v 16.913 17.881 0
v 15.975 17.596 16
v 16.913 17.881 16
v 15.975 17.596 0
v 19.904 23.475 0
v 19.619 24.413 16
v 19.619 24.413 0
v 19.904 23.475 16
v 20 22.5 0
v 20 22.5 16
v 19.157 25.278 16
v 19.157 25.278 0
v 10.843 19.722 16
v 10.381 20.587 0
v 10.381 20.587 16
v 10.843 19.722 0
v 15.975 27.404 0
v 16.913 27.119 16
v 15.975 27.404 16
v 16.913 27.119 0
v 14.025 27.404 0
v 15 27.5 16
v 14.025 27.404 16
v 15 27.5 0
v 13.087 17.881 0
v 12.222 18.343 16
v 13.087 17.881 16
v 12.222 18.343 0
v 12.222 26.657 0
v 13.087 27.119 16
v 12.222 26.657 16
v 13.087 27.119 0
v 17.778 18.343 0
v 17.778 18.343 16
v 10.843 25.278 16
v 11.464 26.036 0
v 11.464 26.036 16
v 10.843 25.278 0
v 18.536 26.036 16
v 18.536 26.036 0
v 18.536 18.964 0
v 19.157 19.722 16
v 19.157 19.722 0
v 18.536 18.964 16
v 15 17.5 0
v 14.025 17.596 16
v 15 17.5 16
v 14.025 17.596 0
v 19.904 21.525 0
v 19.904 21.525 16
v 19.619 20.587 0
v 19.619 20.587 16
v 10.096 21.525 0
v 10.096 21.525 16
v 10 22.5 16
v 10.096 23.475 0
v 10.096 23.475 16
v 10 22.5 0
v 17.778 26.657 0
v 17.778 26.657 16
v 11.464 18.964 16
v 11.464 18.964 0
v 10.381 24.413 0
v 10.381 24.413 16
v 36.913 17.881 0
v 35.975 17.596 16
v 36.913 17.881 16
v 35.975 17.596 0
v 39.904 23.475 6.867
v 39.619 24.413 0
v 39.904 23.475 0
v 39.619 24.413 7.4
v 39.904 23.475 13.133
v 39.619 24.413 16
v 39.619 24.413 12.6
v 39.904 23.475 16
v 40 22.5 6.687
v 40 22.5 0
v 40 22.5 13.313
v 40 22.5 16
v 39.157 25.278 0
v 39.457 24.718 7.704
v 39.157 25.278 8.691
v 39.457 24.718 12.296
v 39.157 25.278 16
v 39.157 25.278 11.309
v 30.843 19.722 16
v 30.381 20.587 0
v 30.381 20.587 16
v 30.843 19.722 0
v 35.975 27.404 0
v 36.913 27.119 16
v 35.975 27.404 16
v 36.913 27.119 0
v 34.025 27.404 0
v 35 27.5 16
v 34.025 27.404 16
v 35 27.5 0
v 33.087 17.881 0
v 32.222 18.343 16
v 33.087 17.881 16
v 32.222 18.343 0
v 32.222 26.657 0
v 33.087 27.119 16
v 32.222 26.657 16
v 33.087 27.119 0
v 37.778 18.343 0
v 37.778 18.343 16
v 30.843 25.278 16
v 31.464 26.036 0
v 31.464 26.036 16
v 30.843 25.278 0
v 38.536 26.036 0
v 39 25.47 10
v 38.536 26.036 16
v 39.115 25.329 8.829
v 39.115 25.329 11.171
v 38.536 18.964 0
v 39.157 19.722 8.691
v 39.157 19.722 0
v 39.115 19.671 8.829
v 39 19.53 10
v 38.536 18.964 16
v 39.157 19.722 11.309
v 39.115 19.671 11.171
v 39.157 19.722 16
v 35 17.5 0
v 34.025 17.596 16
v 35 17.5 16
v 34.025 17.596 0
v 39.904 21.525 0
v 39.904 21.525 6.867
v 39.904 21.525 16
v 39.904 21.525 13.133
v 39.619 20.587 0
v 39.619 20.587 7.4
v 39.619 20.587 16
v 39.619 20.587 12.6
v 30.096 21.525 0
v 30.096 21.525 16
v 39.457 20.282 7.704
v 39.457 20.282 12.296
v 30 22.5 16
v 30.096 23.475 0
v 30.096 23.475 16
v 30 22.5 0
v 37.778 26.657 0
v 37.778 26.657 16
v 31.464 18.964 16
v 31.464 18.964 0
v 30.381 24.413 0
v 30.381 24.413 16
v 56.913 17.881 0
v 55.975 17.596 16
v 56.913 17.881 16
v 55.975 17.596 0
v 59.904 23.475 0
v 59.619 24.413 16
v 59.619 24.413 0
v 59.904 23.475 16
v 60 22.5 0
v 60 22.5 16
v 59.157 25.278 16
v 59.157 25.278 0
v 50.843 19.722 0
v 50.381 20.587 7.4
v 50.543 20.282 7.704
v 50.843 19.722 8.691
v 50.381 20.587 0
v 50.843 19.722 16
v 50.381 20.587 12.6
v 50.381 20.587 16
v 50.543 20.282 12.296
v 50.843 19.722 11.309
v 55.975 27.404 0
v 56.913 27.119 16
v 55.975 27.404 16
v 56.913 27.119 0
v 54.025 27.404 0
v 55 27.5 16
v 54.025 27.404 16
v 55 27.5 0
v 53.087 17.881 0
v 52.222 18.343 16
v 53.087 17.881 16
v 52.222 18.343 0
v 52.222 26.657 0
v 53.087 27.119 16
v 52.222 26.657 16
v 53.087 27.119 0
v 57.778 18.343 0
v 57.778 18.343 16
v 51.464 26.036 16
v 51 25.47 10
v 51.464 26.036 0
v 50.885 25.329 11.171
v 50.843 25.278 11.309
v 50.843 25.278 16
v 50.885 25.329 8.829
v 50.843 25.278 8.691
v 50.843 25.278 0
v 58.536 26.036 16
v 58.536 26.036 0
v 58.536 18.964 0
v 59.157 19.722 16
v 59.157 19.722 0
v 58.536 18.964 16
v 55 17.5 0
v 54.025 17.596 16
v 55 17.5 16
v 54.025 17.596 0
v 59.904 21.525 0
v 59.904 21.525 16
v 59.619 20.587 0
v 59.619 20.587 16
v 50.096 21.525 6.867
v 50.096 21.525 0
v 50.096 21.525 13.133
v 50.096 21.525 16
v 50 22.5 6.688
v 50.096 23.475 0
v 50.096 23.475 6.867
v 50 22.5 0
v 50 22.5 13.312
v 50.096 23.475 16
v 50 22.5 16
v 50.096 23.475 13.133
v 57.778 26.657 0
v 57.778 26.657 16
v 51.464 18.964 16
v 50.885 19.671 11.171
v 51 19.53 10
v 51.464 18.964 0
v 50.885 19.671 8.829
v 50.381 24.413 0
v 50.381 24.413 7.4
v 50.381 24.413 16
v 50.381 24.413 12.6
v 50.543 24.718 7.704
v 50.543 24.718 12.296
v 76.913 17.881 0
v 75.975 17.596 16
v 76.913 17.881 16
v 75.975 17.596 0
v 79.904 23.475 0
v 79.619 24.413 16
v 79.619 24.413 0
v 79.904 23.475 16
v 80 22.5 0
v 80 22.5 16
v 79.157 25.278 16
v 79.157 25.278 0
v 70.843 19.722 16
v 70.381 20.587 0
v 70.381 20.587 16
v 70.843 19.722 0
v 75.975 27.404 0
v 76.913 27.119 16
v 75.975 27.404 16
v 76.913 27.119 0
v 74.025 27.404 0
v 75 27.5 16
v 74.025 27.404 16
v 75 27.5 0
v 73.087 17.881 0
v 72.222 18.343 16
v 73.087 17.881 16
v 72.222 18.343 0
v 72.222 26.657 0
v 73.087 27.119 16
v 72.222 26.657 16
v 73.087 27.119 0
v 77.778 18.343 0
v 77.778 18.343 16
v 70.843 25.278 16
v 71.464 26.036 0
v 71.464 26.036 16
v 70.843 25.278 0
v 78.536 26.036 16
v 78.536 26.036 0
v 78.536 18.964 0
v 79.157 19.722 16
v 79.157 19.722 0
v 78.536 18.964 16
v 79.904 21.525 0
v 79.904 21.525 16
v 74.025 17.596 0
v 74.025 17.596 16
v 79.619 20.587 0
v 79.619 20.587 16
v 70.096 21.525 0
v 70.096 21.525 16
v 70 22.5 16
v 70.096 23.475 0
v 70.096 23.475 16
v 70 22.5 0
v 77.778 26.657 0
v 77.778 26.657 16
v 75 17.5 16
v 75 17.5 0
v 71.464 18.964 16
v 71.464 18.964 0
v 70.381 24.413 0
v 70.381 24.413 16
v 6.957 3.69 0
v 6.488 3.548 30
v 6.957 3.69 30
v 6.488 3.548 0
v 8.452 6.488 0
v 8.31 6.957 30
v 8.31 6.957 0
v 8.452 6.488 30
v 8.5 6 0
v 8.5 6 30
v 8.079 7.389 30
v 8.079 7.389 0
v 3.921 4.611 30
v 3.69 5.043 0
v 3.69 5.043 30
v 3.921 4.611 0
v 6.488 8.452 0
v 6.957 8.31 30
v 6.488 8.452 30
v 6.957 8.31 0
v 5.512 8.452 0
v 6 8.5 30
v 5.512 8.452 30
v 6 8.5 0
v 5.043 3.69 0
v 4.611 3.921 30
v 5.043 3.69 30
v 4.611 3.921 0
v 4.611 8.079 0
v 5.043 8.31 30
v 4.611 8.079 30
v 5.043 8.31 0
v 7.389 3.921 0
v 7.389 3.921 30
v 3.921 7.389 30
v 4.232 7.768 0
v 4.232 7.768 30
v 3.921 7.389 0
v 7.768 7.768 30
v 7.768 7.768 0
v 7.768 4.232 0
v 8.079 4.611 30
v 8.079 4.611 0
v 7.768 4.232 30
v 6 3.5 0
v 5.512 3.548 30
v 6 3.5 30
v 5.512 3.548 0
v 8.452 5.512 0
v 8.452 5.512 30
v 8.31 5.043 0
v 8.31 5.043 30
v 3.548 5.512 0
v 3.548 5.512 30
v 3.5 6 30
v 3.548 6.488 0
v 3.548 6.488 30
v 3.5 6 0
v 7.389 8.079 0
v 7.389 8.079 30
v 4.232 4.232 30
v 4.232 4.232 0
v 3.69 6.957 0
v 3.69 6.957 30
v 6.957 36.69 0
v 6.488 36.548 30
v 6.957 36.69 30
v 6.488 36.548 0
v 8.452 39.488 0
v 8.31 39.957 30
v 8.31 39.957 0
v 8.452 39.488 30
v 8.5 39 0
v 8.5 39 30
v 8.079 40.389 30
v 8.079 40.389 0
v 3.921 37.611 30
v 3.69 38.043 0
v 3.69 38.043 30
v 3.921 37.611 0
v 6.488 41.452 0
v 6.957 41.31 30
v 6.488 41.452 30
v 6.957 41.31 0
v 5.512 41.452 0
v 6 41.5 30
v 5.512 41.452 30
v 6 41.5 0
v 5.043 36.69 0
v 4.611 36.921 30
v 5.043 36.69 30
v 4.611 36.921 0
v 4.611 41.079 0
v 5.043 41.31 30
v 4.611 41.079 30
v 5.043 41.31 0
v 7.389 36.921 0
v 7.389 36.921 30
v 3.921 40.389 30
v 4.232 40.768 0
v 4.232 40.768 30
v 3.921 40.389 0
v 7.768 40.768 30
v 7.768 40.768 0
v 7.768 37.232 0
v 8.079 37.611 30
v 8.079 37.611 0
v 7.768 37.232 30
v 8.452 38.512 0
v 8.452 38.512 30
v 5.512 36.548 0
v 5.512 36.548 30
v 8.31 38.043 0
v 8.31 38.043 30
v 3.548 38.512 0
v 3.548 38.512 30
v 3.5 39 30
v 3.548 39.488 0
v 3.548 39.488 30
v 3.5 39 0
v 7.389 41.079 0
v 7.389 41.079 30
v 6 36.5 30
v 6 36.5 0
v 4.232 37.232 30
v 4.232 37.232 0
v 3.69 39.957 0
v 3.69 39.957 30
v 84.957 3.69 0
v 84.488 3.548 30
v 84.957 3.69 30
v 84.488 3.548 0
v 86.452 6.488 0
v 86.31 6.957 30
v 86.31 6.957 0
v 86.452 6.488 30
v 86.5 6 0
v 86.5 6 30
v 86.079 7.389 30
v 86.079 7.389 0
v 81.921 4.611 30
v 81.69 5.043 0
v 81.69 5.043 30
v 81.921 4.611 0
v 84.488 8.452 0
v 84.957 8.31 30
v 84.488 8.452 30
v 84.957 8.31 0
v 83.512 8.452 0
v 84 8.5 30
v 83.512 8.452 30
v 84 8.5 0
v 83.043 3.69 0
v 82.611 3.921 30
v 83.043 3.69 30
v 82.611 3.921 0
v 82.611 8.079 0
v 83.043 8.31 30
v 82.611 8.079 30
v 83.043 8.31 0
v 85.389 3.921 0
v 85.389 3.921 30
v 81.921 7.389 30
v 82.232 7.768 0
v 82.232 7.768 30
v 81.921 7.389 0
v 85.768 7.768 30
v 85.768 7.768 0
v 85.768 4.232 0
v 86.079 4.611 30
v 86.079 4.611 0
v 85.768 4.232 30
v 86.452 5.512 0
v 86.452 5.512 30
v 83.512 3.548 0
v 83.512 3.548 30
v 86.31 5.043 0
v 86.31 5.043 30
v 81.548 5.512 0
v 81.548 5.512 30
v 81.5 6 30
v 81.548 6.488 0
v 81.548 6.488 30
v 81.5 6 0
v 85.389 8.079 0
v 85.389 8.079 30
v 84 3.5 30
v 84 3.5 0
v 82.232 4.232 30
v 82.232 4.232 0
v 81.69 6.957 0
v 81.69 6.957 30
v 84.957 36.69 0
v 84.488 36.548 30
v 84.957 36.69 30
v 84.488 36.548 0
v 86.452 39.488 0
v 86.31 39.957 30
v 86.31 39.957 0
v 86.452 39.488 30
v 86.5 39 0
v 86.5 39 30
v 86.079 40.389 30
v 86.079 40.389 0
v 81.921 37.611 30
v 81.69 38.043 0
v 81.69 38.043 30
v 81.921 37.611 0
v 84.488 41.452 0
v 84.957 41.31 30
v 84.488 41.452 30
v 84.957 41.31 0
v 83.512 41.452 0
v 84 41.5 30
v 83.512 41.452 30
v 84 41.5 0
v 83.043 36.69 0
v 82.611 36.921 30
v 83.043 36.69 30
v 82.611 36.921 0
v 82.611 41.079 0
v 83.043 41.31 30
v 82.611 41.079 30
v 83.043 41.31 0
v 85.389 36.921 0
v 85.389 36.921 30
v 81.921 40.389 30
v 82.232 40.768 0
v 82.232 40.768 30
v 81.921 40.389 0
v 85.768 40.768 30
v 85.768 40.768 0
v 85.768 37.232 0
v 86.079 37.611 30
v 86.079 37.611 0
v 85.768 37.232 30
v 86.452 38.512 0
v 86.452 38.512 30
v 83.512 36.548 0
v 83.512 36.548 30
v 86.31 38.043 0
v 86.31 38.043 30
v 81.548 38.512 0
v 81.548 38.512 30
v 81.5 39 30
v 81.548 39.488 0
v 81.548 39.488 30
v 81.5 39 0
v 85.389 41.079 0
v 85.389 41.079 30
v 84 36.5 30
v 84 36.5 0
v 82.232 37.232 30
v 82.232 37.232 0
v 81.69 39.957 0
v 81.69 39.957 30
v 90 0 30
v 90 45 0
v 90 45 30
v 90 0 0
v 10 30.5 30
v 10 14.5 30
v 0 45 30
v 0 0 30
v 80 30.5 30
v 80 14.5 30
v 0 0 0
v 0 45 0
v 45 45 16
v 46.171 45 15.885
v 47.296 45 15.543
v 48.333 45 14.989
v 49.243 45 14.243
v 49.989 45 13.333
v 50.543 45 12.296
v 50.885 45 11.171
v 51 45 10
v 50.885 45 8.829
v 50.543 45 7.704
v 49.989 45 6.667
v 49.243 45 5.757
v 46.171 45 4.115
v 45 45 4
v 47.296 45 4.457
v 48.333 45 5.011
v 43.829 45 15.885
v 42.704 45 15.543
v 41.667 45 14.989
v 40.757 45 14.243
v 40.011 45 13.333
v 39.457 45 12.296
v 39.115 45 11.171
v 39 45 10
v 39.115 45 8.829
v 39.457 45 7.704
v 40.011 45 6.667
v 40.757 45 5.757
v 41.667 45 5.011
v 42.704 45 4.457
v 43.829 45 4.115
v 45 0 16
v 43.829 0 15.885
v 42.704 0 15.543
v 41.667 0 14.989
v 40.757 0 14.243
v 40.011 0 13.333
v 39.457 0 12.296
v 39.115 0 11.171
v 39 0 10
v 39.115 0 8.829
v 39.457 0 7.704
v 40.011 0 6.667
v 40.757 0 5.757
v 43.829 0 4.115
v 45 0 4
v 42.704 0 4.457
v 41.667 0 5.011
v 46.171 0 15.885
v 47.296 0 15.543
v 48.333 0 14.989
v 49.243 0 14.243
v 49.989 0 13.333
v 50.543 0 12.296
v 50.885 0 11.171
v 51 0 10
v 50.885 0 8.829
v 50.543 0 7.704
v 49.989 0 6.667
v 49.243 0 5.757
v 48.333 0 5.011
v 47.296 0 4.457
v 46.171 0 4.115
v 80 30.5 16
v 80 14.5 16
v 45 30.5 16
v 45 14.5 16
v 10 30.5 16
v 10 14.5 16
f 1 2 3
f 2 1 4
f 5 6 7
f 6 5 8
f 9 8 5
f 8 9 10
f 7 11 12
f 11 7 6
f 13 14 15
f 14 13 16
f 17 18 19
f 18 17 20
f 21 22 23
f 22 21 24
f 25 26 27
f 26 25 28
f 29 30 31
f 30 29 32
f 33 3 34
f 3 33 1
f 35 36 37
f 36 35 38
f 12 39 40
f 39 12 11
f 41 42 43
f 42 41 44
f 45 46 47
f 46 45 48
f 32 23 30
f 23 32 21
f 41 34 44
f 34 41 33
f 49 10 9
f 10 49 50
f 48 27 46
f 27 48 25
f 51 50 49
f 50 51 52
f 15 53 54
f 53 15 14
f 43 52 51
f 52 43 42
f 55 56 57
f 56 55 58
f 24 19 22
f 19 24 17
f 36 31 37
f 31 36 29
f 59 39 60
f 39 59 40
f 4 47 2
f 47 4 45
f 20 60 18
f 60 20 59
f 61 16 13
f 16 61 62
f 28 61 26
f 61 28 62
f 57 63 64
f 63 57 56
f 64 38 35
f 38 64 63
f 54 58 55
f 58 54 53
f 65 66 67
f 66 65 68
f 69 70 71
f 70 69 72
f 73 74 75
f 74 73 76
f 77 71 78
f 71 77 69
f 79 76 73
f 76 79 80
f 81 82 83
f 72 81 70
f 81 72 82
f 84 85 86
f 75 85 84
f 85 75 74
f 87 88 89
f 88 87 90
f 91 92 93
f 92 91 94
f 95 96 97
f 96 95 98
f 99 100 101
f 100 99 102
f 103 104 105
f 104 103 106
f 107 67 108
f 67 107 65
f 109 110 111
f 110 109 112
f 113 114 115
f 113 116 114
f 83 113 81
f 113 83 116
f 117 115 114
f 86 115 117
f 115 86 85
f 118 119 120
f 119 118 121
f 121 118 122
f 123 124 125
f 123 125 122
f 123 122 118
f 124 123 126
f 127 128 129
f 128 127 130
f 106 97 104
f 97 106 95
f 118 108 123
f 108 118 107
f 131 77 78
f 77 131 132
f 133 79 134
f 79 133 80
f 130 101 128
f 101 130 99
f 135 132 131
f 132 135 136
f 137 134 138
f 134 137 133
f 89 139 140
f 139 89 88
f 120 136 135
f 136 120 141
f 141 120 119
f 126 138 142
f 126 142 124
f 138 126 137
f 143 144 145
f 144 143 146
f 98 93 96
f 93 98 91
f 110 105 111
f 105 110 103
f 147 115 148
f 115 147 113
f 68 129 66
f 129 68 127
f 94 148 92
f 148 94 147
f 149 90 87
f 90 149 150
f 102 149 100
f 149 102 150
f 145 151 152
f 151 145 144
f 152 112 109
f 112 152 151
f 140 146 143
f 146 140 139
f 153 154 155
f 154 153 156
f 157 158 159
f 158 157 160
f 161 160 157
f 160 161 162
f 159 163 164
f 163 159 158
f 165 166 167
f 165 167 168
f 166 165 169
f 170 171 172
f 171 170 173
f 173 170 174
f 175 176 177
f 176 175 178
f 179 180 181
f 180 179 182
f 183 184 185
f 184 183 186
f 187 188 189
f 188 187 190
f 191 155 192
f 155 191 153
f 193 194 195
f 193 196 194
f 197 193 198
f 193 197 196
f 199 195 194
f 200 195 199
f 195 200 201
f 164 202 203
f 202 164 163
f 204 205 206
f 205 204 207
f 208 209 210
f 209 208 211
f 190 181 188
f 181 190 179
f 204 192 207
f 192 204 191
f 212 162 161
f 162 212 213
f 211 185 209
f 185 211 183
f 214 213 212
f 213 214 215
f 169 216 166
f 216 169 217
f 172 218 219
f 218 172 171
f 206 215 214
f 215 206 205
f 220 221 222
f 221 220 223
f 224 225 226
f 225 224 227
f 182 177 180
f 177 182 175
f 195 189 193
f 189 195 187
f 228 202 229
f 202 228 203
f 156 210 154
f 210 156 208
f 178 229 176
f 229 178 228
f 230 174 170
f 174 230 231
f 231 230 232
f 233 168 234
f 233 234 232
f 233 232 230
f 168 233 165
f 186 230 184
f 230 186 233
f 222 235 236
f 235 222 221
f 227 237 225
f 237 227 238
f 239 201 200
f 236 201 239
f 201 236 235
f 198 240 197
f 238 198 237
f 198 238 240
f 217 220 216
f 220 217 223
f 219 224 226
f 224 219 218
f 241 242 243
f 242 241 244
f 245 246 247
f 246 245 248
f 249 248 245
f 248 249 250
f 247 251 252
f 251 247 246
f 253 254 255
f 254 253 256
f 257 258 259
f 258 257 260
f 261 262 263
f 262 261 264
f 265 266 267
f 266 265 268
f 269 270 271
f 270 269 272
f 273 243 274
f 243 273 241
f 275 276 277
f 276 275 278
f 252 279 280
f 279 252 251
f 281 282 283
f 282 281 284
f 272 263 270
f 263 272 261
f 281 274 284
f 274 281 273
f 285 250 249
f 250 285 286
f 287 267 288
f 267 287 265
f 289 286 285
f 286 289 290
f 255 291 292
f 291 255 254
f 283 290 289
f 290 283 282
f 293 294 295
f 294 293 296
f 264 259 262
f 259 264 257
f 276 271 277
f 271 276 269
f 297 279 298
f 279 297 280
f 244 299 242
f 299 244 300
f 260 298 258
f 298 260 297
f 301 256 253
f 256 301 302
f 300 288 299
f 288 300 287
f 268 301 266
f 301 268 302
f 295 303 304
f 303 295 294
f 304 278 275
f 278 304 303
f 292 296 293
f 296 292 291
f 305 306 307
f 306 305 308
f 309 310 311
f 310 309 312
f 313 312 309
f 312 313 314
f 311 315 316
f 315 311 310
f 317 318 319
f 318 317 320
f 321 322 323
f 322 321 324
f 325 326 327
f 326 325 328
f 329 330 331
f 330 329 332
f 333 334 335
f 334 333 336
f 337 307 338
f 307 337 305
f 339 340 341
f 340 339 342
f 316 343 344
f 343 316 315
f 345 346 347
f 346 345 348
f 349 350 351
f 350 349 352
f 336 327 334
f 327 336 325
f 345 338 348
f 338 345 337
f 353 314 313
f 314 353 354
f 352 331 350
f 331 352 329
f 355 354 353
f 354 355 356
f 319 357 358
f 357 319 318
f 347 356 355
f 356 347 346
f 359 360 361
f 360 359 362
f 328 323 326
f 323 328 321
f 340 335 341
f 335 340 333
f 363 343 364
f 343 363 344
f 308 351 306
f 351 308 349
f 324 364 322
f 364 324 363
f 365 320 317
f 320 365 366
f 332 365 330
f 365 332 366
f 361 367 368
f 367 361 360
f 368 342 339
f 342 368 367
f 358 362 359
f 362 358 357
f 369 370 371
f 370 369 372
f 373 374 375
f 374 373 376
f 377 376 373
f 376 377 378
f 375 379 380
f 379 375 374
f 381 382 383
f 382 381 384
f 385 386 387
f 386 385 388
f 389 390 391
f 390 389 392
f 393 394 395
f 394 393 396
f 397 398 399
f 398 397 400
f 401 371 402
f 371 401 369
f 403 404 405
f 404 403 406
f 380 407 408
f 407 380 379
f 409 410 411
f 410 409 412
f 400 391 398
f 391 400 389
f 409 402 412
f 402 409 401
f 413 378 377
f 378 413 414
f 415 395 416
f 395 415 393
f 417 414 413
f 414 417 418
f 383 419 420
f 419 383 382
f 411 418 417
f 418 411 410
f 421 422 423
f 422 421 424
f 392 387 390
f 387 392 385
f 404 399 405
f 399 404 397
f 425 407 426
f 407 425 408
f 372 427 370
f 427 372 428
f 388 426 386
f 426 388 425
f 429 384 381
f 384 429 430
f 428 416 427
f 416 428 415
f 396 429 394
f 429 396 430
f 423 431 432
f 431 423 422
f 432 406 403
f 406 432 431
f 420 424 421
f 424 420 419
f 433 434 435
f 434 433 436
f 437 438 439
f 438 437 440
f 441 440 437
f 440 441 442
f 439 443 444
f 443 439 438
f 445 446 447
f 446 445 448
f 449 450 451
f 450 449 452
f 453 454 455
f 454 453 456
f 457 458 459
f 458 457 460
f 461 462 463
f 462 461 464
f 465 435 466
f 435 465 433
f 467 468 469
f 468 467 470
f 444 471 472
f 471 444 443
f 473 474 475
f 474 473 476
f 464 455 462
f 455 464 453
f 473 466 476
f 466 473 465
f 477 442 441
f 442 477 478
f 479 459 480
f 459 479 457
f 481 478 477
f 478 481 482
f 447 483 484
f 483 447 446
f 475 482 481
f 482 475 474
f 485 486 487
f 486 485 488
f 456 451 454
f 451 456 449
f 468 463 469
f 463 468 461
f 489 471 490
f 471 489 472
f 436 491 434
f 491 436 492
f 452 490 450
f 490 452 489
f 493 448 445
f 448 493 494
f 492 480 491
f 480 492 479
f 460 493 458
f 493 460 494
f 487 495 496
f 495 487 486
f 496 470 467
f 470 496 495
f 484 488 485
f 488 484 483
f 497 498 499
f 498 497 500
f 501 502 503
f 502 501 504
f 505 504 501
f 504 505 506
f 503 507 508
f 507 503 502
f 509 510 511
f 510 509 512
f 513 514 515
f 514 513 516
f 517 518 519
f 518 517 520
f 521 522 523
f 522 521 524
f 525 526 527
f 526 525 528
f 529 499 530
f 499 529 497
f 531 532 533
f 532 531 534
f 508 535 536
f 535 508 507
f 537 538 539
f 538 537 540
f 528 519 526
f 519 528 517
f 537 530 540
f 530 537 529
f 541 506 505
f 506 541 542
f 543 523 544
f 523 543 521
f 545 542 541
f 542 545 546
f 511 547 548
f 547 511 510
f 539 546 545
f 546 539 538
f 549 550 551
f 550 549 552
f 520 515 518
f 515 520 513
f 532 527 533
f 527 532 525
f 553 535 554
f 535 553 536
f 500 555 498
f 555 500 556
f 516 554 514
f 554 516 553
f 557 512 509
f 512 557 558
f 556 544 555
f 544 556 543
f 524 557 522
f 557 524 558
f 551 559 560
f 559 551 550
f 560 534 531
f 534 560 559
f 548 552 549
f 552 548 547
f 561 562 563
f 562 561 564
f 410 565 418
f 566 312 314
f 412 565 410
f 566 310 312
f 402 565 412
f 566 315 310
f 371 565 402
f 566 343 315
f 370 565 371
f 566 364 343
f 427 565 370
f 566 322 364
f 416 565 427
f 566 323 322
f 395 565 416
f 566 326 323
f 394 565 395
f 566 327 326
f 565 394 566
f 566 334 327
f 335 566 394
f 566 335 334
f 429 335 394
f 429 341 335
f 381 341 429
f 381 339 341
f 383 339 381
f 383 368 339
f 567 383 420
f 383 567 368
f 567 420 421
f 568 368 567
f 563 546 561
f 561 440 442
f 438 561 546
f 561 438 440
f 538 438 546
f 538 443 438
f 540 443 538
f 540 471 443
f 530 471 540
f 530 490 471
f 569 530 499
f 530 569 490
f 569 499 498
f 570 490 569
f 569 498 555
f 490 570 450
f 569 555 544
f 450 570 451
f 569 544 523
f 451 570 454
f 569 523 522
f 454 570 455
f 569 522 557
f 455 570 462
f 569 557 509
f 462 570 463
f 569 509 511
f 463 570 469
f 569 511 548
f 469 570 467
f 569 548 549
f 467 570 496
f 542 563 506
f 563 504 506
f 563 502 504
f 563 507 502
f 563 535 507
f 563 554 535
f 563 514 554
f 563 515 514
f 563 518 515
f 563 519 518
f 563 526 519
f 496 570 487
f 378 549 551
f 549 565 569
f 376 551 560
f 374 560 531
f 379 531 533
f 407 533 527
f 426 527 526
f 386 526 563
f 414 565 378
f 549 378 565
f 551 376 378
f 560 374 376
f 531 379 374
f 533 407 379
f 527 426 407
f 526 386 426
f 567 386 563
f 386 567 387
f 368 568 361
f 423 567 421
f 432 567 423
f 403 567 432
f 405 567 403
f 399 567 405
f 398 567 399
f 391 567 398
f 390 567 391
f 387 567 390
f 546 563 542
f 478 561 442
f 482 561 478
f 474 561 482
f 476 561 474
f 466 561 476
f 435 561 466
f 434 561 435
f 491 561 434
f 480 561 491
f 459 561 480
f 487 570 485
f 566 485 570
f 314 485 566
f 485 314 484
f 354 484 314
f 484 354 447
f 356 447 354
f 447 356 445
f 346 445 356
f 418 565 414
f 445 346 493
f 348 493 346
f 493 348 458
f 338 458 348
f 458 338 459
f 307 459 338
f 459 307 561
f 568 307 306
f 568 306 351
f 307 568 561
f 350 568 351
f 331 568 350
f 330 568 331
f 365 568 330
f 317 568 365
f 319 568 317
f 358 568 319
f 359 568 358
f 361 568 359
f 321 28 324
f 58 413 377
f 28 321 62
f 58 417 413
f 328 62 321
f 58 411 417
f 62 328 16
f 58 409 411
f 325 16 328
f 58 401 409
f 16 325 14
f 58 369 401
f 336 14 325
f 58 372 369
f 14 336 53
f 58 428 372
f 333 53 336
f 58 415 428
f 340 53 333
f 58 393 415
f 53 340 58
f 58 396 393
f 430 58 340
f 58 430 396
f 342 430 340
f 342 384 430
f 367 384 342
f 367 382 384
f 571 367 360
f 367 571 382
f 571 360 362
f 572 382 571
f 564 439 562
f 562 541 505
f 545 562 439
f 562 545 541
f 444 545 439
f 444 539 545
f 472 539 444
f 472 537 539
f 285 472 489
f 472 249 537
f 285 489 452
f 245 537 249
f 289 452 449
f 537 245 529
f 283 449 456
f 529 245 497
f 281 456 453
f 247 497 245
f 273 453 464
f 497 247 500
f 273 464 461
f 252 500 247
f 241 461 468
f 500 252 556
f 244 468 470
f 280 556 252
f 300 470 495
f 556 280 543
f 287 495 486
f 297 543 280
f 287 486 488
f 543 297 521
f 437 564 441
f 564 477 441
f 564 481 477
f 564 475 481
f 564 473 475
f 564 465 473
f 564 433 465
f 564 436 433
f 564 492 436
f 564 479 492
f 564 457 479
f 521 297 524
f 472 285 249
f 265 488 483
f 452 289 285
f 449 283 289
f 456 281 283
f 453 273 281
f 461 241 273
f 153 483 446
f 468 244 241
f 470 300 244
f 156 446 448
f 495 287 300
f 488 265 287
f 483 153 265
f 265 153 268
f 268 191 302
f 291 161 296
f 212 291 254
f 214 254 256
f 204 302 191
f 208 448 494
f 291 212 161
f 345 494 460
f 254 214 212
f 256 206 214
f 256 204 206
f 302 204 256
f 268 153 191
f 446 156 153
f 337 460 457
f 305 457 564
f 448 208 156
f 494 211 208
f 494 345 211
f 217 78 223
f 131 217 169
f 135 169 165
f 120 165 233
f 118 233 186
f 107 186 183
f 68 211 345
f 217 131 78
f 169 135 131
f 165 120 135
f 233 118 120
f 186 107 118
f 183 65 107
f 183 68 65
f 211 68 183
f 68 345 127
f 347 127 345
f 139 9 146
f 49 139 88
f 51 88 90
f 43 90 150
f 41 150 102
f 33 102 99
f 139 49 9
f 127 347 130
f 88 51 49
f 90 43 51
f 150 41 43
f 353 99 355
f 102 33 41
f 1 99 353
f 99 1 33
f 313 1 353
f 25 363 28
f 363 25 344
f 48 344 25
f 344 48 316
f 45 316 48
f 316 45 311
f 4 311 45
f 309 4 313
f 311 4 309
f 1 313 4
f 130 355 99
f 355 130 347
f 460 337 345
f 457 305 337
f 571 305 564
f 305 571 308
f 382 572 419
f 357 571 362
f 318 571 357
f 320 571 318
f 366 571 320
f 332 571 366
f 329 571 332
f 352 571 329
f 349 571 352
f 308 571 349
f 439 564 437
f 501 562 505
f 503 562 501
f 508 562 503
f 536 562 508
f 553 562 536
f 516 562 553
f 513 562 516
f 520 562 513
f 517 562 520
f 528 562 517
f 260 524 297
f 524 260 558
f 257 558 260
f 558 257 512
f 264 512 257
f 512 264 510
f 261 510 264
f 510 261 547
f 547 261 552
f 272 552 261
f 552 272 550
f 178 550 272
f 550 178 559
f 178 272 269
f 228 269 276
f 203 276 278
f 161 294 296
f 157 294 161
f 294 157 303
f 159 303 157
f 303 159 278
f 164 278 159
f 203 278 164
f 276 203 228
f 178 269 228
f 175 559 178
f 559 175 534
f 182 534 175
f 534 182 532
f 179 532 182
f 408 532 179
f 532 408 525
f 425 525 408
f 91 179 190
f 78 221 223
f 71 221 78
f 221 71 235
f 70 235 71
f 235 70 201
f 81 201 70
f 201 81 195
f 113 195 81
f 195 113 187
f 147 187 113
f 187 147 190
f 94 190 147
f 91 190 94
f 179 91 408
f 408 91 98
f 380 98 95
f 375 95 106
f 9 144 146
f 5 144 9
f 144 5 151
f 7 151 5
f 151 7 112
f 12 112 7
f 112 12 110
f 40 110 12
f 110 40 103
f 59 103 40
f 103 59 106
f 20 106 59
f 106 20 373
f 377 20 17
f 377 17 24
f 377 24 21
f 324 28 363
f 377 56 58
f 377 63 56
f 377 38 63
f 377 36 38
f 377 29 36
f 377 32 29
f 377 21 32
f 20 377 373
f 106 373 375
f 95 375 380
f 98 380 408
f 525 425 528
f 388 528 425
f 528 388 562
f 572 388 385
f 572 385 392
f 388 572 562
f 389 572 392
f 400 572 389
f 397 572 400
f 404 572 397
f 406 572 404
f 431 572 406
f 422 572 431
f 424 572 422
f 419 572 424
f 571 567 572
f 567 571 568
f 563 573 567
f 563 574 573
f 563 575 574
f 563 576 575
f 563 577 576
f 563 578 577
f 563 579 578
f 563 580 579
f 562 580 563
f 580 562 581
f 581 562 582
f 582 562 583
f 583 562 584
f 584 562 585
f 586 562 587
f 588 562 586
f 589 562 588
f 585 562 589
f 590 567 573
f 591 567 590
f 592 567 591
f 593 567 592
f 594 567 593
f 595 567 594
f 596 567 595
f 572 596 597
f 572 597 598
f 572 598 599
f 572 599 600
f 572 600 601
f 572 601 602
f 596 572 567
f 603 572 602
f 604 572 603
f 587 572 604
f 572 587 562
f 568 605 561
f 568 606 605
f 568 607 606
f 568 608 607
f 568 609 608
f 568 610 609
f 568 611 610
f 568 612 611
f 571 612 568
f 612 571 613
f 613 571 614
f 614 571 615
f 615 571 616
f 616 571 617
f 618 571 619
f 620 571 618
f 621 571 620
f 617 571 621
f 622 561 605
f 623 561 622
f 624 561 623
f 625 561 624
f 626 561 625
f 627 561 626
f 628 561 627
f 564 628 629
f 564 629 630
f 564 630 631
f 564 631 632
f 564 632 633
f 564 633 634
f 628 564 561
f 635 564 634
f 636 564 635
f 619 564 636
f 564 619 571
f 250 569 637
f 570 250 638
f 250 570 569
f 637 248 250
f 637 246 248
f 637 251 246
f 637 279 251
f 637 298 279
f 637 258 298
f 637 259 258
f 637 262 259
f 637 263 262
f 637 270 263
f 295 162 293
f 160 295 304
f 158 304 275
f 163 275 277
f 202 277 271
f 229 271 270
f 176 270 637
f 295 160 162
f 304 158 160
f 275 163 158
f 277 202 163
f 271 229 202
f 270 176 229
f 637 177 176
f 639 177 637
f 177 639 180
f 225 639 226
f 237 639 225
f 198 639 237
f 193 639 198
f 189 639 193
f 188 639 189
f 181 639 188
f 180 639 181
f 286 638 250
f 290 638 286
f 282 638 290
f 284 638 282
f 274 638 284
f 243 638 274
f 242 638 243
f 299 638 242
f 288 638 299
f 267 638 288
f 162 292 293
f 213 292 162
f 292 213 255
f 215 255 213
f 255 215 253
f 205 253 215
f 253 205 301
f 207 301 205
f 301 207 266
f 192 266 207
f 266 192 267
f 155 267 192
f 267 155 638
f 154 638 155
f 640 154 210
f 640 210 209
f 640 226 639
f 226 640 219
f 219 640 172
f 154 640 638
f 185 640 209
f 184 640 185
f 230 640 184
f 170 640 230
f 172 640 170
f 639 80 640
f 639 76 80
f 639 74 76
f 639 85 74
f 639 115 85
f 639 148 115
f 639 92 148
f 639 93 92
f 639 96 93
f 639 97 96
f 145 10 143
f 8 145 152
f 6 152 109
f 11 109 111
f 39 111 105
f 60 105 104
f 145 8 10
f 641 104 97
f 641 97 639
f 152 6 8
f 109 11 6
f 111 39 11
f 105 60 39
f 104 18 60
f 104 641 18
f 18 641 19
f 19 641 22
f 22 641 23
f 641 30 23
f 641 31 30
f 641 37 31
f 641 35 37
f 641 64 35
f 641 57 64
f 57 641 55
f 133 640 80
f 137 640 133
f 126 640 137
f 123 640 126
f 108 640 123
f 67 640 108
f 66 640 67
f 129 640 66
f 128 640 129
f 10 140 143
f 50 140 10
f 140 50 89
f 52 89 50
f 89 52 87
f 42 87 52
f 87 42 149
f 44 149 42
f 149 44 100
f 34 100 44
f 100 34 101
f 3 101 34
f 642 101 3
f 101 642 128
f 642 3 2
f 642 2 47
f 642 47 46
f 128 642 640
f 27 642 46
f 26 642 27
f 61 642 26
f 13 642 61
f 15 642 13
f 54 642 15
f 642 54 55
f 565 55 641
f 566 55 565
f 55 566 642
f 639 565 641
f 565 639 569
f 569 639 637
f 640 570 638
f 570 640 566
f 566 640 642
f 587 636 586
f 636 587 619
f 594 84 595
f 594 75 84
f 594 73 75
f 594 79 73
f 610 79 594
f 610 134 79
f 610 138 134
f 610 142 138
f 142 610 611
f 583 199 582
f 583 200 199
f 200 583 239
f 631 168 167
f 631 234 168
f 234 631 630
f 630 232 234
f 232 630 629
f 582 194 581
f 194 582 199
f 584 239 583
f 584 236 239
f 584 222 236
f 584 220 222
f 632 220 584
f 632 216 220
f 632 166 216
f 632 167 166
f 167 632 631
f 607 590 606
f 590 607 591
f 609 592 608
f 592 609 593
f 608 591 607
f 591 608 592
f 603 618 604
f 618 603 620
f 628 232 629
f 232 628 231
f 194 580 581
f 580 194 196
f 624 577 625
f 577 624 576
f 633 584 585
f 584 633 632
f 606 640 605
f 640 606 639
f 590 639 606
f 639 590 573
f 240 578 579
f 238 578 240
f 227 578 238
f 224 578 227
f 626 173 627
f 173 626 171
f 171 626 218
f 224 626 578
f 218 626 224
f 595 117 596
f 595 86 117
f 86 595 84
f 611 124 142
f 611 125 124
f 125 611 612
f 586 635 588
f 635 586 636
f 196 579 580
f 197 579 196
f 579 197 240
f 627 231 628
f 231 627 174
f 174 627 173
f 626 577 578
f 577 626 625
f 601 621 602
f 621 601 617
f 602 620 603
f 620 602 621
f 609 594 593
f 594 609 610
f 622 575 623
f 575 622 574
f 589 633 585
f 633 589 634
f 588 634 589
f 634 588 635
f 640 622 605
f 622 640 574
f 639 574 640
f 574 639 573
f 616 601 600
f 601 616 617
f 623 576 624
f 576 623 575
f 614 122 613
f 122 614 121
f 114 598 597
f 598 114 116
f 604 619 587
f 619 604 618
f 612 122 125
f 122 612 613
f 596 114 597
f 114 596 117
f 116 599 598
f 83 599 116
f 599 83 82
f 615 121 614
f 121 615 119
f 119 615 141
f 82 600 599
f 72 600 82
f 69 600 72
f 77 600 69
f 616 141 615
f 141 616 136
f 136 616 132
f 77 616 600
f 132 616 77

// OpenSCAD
$fn = 32;

// ----------------------------------------------------------------------
// Manifold block: side_outlet manifold
// ----------------------------------------------------------------------

// --- parameters (mm) ---
block_l = 90;             // block length, X
block_w = 45;             // block width, Y
block_h = 30;             // block height, Z
port_d = 10;              // port bore diameter
port_pitch = 20;          // port pitch along X
gallery_d = 16;           // top gallery width, Y
gallery_depth = 14;       // gallery pocket depth
wall_p = 10;              // gallery end wall thickness, X
mnt_d = 5;                // mounting hole diameter
mnt_in = 6;               // mounting hole inset from the edges
out_d = 12;               // outlet bore diameter
out_z = 10;               // outlet axis height

n_ports = 4;  // ports in the row
port_x0 = (block_l - (n_ports - 1) * port_pitch) / 2;  // first port X

difference() {
  cube([block_l, block_w, block_h]);
  for (i = [0 : n_ports - 1])
    translate([port_x0 + i * port_pitch, block_w / 2, -1])
      cylinder(h = block_h + 2, d = port_d);
  translate([wall_p, block_w / 2 - gallery_d / 2, block_h - gallery_depth])
    cube([block_l - 2 * wall_p, gallery_d, gallery_depth + 1]);
  for (cx = [mnt_in, block_l - mnt_in])
    for (cy = [mnt_in, block_w - mnt_in])
      translate([cx, cy, -1]) cylinder(h = block_h + 2, d = mnt_d);
  translate([block_l / 2, -1, out_z]) rotate([-90, 0, 0])
    cylinder(h = block_w + 2, d = out_d);
}
